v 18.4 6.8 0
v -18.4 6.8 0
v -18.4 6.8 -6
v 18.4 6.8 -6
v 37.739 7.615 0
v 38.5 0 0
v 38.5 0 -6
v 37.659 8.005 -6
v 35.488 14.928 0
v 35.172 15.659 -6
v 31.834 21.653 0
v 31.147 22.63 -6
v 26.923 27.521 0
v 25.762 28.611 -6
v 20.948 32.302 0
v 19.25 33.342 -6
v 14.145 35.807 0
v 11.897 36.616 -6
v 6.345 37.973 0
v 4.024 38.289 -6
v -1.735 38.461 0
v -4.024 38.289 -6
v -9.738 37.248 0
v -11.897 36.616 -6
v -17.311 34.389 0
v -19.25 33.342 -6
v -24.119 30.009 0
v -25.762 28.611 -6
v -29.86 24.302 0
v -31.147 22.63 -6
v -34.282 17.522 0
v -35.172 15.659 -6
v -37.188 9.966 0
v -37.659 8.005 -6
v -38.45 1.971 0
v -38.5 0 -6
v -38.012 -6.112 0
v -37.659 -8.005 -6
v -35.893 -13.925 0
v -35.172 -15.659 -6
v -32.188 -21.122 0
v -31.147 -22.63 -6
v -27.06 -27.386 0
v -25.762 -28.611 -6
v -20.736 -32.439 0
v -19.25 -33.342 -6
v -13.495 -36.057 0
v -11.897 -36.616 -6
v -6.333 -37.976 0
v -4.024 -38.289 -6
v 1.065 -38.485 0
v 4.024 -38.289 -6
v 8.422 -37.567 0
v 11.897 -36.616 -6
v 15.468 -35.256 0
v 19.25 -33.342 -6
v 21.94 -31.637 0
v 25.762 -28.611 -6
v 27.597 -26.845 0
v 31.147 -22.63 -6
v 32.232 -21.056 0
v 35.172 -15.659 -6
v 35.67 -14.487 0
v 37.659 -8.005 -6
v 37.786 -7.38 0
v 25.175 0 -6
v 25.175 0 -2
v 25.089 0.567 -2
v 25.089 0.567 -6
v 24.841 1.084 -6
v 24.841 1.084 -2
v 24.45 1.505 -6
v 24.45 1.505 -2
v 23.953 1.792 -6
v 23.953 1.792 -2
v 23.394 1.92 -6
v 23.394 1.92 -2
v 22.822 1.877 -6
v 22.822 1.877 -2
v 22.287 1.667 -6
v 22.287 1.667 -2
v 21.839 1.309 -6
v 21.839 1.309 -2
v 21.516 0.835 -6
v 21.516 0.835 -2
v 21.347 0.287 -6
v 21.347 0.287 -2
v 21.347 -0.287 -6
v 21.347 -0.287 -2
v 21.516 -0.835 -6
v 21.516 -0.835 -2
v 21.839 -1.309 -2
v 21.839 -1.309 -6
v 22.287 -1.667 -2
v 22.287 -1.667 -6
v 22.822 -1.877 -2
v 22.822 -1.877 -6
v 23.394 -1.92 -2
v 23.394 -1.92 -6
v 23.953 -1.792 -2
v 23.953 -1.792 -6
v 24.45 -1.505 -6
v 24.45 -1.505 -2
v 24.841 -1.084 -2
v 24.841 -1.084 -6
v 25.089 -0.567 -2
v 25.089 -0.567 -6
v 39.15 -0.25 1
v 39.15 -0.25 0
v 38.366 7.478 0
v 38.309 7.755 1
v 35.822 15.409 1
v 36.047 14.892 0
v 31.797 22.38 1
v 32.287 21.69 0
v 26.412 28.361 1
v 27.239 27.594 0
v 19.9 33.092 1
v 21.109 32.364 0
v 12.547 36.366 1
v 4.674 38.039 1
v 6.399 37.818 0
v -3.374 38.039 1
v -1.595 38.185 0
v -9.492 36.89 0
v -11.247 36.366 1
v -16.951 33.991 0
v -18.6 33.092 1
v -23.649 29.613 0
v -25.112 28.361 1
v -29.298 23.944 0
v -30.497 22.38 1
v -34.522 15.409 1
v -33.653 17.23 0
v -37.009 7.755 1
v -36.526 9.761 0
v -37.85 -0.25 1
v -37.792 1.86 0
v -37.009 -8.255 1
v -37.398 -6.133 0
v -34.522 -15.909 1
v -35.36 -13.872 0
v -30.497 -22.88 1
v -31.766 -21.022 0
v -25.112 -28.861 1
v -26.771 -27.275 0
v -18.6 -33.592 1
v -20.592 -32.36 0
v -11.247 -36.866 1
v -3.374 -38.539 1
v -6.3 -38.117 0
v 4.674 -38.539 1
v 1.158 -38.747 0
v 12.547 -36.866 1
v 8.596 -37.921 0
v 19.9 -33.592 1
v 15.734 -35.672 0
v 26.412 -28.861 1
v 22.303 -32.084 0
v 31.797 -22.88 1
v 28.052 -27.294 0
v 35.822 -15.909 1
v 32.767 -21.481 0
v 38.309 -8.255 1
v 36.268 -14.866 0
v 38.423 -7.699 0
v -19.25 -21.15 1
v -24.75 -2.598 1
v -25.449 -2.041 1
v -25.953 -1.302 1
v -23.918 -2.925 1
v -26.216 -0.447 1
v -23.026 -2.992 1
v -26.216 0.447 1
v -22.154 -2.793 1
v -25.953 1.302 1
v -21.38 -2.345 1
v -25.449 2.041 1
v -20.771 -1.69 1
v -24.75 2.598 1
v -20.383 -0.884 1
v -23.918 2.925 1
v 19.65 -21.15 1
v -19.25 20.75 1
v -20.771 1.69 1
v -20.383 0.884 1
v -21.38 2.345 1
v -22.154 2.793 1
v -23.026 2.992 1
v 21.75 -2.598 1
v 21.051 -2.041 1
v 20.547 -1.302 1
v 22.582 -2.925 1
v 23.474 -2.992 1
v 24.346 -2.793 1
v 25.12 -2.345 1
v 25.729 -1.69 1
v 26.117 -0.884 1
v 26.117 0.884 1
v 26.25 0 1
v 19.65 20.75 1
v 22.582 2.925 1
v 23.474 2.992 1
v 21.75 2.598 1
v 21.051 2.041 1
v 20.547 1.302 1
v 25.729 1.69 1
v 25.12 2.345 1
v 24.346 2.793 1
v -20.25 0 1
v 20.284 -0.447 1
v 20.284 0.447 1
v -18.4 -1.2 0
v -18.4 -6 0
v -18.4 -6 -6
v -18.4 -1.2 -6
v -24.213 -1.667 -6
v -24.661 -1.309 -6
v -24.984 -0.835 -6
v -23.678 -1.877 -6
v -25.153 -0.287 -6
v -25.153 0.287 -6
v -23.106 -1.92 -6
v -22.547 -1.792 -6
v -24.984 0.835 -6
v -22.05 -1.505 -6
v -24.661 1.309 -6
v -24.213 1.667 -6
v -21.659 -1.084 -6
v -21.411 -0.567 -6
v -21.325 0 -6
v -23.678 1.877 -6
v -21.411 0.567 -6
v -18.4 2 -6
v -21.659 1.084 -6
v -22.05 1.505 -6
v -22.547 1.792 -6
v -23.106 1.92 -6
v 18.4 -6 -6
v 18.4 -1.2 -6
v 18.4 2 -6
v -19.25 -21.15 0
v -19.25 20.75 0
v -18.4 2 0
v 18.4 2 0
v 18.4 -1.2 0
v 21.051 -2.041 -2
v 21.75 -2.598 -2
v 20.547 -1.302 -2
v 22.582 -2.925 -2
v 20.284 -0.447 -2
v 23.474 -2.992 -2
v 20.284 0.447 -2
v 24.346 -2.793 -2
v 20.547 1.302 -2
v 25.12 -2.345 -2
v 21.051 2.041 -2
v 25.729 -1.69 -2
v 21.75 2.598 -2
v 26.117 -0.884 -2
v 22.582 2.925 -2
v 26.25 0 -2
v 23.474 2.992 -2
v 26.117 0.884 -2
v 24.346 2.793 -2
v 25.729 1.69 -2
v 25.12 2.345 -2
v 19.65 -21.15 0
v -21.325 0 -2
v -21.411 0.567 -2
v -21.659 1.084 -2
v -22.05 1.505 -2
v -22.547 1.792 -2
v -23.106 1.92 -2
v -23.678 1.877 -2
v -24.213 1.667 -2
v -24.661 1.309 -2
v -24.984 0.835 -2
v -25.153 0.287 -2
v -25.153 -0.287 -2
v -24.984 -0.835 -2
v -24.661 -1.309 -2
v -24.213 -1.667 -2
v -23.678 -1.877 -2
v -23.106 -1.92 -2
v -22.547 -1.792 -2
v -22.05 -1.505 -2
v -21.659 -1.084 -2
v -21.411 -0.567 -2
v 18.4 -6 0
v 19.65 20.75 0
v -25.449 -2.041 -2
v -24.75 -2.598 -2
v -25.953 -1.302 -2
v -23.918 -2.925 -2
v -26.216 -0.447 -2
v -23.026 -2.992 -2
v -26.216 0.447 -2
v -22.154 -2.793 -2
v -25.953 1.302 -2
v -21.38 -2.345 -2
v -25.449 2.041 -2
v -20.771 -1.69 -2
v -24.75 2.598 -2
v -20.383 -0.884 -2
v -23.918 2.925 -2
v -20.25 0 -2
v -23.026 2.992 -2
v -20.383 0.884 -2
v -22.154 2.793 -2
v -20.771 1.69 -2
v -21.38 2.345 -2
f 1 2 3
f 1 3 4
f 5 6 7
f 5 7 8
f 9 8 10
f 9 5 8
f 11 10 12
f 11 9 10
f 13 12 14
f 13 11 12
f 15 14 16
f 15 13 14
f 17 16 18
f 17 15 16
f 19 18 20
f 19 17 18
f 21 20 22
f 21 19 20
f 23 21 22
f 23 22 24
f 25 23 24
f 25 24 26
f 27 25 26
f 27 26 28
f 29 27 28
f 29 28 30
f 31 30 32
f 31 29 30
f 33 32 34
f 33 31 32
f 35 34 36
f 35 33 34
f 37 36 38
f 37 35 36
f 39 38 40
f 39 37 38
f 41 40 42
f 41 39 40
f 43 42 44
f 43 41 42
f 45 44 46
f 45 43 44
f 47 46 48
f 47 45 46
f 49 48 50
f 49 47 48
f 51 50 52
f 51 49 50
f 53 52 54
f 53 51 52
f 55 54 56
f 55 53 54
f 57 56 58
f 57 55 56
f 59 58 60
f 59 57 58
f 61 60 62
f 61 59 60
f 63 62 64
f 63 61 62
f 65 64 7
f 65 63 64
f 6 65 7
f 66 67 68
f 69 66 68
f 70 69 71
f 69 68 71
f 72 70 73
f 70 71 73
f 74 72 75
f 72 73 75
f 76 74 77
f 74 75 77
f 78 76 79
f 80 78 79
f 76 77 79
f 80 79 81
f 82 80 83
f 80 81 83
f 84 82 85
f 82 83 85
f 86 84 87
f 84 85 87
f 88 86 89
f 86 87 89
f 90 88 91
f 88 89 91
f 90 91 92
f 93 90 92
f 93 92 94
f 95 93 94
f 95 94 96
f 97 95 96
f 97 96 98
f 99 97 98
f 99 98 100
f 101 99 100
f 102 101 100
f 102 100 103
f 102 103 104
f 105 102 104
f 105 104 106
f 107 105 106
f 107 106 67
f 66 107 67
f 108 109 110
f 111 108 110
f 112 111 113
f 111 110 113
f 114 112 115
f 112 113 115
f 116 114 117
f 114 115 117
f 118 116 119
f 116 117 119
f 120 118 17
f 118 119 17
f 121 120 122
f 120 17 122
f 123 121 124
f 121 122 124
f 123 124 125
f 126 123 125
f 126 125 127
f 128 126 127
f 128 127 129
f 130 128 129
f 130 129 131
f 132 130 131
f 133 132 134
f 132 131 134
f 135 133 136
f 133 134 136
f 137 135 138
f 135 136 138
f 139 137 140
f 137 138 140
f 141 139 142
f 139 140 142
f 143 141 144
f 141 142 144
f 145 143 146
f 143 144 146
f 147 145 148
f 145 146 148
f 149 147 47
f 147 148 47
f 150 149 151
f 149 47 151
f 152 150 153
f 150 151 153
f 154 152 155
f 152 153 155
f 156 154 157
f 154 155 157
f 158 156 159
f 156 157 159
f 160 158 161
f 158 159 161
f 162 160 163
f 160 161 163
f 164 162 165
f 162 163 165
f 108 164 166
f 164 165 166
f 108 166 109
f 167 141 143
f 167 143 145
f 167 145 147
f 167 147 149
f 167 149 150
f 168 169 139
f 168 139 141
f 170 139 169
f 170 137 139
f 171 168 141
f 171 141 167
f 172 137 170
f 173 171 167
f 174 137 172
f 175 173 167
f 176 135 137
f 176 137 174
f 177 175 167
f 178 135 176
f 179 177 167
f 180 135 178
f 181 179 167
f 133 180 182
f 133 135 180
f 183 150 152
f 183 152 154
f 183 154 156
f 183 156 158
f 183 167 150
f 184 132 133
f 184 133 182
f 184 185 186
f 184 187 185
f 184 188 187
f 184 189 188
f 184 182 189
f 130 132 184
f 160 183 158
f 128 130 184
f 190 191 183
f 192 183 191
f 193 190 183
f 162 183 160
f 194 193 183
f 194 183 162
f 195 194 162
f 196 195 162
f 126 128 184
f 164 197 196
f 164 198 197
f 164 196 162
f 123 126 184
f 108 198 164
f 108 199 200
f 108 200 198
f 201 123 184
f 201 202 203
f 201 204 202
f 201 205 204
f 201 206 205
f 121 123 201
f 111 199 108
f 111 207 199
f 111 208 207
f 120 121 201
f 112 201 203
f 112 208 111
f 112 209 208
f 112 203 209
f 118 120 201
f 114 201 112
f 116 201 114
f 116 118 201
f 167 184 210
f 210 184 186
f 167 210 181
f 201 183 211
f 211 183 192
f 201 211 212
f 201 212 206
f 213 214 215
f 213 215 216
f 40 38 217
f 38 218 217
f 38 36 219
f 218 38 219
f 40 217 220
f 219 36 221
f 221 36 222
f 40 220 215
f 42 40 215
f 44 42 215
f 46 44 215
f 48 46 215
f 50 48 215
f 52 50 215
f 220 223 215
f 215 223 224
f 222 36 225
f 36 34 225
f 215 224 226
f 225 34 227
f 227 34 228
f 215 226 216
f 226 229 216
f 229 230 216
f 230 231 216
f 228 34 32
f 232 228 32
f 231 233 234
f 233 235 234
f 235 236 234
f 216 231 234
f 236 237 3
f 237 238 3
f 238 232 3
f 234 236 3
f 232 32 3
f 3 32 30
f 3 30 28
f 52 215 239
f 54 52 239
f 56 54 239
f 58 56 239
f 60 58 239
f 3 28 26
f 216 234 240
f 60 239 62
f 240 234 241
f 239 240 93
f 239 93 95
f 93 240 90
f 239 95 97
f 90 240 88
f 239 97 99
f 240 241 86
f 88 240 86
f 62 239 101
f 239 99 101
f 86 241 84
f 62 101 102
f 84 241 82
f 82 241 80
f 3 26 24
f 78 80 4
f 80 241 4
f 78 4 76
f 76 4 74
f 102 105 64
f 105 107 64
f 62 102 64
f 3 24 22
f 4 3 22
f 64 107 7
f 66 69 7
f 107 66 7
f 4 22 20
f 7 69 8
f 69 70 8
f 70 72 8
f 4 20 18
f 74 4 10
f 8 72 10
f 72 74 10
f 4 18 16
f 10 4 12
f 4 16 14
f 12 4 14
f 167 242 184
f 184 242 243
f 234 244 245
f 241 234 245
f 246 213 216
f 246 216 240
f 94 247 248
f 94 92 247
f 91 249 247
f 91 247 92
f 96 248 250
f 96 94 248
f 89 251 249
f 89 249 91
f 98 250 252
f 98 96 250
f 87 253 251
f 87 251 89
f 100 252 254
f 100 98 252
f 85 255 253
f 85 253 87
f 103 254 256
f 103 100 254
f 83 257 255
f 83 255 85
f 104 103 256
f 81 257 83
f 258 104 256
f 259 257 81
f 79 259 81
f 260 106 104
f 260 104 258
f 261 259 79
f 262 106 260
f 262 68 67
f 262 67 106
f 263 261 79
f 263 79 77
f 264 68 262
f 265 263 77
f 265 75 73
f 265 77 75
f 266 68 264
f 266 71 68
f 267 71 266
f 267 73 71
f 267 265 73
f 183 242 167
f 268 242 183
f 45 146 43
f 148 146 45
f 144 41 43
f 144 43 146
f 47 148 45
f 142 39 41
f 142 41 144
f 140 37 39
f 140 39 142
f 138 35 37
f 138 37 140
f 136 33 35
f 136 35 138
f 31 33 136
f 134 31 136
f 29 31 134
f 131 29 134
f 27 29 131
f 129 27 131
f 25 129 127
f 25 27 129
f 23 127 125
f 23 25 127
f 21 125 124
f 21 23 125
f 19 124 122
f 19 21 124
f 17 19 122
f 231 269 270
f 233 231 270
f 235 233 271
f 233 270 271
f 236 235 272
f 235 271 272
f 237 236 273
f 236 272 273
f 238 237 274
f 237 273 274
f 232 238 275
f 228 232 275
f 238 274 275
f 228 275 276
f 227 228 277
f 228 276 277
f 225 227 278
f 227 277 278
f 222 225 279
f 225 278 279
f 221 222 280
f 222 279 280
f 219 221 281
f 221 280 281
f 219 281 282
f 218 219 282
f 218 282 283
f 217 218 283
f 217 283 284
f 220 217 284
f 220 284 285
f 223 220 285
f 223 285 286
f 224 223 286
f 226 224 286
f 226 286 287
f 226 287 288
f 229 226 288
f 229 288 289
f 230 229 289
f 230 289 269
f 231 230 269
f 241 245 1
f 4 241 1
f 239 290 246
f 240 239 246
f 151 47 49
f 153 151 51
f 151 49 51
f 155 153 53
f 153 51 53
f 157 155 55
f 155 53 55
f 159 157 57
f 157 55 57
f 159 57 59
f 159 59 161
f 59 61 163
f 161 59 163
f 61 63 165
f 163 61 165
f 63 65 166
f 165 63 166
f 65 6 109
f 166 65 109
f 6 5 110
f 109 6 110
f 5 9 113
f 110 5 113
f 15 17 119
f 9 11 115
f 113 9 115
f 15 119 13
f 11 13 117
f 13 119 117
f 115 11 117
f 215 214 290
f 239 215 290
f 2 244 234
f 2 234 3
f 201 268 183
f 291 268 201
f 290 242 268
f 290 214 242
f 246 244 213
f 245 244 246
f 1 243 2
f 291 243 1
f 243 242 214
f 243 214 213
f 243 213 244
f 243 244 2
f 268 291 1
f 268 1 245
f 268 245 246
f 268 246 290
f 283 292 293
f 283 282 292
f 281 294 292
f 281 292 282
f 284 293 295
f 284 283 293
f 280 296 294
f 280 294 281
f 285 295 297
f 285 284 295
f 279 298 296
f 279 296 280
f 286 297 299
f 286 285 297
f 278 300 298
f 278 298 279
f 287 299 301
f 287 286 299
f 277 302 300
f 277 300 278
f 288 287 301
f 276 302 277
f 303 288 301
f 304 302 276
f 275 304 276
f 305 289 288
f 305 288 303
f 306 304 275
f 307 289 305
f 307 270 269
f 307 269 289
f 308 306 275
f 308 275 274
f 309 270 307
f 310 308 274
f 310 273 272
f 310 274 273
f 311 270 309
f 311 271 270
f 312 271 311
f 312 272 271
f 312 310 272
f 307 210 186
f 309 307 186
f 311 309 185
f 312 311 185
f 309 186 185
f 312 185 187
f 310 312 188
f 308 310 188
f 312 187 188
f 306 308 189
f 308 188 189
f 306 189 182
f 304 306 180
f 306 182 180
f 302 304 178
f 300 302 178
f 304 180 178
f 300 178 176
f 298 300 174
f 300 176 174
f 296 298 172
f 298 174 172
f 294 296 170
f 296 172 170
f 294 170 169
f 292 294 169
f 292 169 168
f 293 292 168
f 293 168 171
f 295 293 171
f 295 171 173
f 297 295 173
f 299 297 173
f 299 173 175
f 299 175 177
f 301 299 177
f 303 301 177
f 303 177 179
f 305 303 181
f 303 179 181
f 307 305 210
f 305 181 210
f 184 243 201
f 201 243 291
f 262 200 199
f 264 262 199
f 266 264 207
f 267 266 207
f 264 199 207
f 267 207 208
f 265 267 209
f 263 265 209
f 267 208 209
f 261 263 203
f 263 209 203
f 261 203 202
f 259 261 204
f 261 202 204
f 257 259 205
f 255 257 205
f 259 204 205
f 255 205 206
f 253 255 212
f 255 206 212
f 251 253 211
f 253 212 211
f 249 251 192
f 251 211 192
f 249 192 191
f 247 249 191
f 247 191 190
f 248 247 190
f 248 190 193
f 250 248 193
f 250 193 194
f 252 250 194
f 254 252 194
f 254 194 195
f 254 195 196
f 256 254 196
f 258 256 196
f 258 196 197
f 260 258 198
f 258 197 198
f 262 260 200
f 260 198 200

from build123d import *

# Parameters (mm, degrees)
SKETCH1_R                  = 38.5
SKETCH1_R_2                = 1.925
SKETCH1_W                  = 36.8
SKETCH1_H                  = 4.8
MAIN_FLANGE_COUPLING_DEPTH = 6
SKETCH2_R                  = 38.5
SKETCH2_R_2                = 1.7
SKETCH2_W                  = 38.9
SKETCH2_H                  = 41.9
BOSS_EXTRUDE1_DEPTH        = 1
SKETCH3_R                  = 3
CUT_EXTRUDE1_DEPTH         = 3


with BuildPart() as part:
    # Sketch1 → Main Flange Coupling (new body)
    with BuildSketch(Plane.XY):
        Circle(SKETCH1_R)
        with Locations((-23.25, 0)):
            Circle(SKETCH1_R_2, mode=Mode.SUBTRACT)
        with Locations((23.25, 0)):
            Circle(SKETCH1_R_2, mode=Mode.SUBTRACT)
        with Locations((0, 4.4)):
            Rectangle(SKETCH1_W, SKETCH1_H, mode=Mode.SUBTRACT)
        with Locations((0, -3.6)):
            Rectangle(SKETCH1_W, SKETCH1_H, mode=Mode.SUBTRACT)
    extrude(amount=-MAIN_FLANGE_COUPLING_DEPTH)

    # Sketch2 → Boss-Extrude1 (add)
    with BuildSketch(Plane.XY):
        with Locations((0.65, -0.25)):
            Circle(SKETCH2_R)
        with Locations((-23.25, 0)):
            Circle(SKETCH2_R_2, mode=Mode.SUBTRACT)
        with Locations((23.25, 0)):
            Circle(SKETCH2_R_2, mode=Mode.SUBTRACT)
        with Locations((0.2, -0.2)):
            Rectangle(SKETCH2_W, SKETCH2_H, mode=Mode.SUBTRACT)
    extrude(amount=BOSS_EXTRUDE1_DEPTH)

    # Sketch3 → Cut-Extrude1 (cut)
    with BuildSketch(Plane.XY.offset(1)):
        with Locations((-23.25, 0)):
            Circle(SKETCH3_R)
        with Locations((23.25, 0)):
            Circle(SKETCH3_R)
    extrude(amount=-CUT_EXTRUDE1_DEPTH, mode=Mode.SUBTRACT)


solid = part.part
